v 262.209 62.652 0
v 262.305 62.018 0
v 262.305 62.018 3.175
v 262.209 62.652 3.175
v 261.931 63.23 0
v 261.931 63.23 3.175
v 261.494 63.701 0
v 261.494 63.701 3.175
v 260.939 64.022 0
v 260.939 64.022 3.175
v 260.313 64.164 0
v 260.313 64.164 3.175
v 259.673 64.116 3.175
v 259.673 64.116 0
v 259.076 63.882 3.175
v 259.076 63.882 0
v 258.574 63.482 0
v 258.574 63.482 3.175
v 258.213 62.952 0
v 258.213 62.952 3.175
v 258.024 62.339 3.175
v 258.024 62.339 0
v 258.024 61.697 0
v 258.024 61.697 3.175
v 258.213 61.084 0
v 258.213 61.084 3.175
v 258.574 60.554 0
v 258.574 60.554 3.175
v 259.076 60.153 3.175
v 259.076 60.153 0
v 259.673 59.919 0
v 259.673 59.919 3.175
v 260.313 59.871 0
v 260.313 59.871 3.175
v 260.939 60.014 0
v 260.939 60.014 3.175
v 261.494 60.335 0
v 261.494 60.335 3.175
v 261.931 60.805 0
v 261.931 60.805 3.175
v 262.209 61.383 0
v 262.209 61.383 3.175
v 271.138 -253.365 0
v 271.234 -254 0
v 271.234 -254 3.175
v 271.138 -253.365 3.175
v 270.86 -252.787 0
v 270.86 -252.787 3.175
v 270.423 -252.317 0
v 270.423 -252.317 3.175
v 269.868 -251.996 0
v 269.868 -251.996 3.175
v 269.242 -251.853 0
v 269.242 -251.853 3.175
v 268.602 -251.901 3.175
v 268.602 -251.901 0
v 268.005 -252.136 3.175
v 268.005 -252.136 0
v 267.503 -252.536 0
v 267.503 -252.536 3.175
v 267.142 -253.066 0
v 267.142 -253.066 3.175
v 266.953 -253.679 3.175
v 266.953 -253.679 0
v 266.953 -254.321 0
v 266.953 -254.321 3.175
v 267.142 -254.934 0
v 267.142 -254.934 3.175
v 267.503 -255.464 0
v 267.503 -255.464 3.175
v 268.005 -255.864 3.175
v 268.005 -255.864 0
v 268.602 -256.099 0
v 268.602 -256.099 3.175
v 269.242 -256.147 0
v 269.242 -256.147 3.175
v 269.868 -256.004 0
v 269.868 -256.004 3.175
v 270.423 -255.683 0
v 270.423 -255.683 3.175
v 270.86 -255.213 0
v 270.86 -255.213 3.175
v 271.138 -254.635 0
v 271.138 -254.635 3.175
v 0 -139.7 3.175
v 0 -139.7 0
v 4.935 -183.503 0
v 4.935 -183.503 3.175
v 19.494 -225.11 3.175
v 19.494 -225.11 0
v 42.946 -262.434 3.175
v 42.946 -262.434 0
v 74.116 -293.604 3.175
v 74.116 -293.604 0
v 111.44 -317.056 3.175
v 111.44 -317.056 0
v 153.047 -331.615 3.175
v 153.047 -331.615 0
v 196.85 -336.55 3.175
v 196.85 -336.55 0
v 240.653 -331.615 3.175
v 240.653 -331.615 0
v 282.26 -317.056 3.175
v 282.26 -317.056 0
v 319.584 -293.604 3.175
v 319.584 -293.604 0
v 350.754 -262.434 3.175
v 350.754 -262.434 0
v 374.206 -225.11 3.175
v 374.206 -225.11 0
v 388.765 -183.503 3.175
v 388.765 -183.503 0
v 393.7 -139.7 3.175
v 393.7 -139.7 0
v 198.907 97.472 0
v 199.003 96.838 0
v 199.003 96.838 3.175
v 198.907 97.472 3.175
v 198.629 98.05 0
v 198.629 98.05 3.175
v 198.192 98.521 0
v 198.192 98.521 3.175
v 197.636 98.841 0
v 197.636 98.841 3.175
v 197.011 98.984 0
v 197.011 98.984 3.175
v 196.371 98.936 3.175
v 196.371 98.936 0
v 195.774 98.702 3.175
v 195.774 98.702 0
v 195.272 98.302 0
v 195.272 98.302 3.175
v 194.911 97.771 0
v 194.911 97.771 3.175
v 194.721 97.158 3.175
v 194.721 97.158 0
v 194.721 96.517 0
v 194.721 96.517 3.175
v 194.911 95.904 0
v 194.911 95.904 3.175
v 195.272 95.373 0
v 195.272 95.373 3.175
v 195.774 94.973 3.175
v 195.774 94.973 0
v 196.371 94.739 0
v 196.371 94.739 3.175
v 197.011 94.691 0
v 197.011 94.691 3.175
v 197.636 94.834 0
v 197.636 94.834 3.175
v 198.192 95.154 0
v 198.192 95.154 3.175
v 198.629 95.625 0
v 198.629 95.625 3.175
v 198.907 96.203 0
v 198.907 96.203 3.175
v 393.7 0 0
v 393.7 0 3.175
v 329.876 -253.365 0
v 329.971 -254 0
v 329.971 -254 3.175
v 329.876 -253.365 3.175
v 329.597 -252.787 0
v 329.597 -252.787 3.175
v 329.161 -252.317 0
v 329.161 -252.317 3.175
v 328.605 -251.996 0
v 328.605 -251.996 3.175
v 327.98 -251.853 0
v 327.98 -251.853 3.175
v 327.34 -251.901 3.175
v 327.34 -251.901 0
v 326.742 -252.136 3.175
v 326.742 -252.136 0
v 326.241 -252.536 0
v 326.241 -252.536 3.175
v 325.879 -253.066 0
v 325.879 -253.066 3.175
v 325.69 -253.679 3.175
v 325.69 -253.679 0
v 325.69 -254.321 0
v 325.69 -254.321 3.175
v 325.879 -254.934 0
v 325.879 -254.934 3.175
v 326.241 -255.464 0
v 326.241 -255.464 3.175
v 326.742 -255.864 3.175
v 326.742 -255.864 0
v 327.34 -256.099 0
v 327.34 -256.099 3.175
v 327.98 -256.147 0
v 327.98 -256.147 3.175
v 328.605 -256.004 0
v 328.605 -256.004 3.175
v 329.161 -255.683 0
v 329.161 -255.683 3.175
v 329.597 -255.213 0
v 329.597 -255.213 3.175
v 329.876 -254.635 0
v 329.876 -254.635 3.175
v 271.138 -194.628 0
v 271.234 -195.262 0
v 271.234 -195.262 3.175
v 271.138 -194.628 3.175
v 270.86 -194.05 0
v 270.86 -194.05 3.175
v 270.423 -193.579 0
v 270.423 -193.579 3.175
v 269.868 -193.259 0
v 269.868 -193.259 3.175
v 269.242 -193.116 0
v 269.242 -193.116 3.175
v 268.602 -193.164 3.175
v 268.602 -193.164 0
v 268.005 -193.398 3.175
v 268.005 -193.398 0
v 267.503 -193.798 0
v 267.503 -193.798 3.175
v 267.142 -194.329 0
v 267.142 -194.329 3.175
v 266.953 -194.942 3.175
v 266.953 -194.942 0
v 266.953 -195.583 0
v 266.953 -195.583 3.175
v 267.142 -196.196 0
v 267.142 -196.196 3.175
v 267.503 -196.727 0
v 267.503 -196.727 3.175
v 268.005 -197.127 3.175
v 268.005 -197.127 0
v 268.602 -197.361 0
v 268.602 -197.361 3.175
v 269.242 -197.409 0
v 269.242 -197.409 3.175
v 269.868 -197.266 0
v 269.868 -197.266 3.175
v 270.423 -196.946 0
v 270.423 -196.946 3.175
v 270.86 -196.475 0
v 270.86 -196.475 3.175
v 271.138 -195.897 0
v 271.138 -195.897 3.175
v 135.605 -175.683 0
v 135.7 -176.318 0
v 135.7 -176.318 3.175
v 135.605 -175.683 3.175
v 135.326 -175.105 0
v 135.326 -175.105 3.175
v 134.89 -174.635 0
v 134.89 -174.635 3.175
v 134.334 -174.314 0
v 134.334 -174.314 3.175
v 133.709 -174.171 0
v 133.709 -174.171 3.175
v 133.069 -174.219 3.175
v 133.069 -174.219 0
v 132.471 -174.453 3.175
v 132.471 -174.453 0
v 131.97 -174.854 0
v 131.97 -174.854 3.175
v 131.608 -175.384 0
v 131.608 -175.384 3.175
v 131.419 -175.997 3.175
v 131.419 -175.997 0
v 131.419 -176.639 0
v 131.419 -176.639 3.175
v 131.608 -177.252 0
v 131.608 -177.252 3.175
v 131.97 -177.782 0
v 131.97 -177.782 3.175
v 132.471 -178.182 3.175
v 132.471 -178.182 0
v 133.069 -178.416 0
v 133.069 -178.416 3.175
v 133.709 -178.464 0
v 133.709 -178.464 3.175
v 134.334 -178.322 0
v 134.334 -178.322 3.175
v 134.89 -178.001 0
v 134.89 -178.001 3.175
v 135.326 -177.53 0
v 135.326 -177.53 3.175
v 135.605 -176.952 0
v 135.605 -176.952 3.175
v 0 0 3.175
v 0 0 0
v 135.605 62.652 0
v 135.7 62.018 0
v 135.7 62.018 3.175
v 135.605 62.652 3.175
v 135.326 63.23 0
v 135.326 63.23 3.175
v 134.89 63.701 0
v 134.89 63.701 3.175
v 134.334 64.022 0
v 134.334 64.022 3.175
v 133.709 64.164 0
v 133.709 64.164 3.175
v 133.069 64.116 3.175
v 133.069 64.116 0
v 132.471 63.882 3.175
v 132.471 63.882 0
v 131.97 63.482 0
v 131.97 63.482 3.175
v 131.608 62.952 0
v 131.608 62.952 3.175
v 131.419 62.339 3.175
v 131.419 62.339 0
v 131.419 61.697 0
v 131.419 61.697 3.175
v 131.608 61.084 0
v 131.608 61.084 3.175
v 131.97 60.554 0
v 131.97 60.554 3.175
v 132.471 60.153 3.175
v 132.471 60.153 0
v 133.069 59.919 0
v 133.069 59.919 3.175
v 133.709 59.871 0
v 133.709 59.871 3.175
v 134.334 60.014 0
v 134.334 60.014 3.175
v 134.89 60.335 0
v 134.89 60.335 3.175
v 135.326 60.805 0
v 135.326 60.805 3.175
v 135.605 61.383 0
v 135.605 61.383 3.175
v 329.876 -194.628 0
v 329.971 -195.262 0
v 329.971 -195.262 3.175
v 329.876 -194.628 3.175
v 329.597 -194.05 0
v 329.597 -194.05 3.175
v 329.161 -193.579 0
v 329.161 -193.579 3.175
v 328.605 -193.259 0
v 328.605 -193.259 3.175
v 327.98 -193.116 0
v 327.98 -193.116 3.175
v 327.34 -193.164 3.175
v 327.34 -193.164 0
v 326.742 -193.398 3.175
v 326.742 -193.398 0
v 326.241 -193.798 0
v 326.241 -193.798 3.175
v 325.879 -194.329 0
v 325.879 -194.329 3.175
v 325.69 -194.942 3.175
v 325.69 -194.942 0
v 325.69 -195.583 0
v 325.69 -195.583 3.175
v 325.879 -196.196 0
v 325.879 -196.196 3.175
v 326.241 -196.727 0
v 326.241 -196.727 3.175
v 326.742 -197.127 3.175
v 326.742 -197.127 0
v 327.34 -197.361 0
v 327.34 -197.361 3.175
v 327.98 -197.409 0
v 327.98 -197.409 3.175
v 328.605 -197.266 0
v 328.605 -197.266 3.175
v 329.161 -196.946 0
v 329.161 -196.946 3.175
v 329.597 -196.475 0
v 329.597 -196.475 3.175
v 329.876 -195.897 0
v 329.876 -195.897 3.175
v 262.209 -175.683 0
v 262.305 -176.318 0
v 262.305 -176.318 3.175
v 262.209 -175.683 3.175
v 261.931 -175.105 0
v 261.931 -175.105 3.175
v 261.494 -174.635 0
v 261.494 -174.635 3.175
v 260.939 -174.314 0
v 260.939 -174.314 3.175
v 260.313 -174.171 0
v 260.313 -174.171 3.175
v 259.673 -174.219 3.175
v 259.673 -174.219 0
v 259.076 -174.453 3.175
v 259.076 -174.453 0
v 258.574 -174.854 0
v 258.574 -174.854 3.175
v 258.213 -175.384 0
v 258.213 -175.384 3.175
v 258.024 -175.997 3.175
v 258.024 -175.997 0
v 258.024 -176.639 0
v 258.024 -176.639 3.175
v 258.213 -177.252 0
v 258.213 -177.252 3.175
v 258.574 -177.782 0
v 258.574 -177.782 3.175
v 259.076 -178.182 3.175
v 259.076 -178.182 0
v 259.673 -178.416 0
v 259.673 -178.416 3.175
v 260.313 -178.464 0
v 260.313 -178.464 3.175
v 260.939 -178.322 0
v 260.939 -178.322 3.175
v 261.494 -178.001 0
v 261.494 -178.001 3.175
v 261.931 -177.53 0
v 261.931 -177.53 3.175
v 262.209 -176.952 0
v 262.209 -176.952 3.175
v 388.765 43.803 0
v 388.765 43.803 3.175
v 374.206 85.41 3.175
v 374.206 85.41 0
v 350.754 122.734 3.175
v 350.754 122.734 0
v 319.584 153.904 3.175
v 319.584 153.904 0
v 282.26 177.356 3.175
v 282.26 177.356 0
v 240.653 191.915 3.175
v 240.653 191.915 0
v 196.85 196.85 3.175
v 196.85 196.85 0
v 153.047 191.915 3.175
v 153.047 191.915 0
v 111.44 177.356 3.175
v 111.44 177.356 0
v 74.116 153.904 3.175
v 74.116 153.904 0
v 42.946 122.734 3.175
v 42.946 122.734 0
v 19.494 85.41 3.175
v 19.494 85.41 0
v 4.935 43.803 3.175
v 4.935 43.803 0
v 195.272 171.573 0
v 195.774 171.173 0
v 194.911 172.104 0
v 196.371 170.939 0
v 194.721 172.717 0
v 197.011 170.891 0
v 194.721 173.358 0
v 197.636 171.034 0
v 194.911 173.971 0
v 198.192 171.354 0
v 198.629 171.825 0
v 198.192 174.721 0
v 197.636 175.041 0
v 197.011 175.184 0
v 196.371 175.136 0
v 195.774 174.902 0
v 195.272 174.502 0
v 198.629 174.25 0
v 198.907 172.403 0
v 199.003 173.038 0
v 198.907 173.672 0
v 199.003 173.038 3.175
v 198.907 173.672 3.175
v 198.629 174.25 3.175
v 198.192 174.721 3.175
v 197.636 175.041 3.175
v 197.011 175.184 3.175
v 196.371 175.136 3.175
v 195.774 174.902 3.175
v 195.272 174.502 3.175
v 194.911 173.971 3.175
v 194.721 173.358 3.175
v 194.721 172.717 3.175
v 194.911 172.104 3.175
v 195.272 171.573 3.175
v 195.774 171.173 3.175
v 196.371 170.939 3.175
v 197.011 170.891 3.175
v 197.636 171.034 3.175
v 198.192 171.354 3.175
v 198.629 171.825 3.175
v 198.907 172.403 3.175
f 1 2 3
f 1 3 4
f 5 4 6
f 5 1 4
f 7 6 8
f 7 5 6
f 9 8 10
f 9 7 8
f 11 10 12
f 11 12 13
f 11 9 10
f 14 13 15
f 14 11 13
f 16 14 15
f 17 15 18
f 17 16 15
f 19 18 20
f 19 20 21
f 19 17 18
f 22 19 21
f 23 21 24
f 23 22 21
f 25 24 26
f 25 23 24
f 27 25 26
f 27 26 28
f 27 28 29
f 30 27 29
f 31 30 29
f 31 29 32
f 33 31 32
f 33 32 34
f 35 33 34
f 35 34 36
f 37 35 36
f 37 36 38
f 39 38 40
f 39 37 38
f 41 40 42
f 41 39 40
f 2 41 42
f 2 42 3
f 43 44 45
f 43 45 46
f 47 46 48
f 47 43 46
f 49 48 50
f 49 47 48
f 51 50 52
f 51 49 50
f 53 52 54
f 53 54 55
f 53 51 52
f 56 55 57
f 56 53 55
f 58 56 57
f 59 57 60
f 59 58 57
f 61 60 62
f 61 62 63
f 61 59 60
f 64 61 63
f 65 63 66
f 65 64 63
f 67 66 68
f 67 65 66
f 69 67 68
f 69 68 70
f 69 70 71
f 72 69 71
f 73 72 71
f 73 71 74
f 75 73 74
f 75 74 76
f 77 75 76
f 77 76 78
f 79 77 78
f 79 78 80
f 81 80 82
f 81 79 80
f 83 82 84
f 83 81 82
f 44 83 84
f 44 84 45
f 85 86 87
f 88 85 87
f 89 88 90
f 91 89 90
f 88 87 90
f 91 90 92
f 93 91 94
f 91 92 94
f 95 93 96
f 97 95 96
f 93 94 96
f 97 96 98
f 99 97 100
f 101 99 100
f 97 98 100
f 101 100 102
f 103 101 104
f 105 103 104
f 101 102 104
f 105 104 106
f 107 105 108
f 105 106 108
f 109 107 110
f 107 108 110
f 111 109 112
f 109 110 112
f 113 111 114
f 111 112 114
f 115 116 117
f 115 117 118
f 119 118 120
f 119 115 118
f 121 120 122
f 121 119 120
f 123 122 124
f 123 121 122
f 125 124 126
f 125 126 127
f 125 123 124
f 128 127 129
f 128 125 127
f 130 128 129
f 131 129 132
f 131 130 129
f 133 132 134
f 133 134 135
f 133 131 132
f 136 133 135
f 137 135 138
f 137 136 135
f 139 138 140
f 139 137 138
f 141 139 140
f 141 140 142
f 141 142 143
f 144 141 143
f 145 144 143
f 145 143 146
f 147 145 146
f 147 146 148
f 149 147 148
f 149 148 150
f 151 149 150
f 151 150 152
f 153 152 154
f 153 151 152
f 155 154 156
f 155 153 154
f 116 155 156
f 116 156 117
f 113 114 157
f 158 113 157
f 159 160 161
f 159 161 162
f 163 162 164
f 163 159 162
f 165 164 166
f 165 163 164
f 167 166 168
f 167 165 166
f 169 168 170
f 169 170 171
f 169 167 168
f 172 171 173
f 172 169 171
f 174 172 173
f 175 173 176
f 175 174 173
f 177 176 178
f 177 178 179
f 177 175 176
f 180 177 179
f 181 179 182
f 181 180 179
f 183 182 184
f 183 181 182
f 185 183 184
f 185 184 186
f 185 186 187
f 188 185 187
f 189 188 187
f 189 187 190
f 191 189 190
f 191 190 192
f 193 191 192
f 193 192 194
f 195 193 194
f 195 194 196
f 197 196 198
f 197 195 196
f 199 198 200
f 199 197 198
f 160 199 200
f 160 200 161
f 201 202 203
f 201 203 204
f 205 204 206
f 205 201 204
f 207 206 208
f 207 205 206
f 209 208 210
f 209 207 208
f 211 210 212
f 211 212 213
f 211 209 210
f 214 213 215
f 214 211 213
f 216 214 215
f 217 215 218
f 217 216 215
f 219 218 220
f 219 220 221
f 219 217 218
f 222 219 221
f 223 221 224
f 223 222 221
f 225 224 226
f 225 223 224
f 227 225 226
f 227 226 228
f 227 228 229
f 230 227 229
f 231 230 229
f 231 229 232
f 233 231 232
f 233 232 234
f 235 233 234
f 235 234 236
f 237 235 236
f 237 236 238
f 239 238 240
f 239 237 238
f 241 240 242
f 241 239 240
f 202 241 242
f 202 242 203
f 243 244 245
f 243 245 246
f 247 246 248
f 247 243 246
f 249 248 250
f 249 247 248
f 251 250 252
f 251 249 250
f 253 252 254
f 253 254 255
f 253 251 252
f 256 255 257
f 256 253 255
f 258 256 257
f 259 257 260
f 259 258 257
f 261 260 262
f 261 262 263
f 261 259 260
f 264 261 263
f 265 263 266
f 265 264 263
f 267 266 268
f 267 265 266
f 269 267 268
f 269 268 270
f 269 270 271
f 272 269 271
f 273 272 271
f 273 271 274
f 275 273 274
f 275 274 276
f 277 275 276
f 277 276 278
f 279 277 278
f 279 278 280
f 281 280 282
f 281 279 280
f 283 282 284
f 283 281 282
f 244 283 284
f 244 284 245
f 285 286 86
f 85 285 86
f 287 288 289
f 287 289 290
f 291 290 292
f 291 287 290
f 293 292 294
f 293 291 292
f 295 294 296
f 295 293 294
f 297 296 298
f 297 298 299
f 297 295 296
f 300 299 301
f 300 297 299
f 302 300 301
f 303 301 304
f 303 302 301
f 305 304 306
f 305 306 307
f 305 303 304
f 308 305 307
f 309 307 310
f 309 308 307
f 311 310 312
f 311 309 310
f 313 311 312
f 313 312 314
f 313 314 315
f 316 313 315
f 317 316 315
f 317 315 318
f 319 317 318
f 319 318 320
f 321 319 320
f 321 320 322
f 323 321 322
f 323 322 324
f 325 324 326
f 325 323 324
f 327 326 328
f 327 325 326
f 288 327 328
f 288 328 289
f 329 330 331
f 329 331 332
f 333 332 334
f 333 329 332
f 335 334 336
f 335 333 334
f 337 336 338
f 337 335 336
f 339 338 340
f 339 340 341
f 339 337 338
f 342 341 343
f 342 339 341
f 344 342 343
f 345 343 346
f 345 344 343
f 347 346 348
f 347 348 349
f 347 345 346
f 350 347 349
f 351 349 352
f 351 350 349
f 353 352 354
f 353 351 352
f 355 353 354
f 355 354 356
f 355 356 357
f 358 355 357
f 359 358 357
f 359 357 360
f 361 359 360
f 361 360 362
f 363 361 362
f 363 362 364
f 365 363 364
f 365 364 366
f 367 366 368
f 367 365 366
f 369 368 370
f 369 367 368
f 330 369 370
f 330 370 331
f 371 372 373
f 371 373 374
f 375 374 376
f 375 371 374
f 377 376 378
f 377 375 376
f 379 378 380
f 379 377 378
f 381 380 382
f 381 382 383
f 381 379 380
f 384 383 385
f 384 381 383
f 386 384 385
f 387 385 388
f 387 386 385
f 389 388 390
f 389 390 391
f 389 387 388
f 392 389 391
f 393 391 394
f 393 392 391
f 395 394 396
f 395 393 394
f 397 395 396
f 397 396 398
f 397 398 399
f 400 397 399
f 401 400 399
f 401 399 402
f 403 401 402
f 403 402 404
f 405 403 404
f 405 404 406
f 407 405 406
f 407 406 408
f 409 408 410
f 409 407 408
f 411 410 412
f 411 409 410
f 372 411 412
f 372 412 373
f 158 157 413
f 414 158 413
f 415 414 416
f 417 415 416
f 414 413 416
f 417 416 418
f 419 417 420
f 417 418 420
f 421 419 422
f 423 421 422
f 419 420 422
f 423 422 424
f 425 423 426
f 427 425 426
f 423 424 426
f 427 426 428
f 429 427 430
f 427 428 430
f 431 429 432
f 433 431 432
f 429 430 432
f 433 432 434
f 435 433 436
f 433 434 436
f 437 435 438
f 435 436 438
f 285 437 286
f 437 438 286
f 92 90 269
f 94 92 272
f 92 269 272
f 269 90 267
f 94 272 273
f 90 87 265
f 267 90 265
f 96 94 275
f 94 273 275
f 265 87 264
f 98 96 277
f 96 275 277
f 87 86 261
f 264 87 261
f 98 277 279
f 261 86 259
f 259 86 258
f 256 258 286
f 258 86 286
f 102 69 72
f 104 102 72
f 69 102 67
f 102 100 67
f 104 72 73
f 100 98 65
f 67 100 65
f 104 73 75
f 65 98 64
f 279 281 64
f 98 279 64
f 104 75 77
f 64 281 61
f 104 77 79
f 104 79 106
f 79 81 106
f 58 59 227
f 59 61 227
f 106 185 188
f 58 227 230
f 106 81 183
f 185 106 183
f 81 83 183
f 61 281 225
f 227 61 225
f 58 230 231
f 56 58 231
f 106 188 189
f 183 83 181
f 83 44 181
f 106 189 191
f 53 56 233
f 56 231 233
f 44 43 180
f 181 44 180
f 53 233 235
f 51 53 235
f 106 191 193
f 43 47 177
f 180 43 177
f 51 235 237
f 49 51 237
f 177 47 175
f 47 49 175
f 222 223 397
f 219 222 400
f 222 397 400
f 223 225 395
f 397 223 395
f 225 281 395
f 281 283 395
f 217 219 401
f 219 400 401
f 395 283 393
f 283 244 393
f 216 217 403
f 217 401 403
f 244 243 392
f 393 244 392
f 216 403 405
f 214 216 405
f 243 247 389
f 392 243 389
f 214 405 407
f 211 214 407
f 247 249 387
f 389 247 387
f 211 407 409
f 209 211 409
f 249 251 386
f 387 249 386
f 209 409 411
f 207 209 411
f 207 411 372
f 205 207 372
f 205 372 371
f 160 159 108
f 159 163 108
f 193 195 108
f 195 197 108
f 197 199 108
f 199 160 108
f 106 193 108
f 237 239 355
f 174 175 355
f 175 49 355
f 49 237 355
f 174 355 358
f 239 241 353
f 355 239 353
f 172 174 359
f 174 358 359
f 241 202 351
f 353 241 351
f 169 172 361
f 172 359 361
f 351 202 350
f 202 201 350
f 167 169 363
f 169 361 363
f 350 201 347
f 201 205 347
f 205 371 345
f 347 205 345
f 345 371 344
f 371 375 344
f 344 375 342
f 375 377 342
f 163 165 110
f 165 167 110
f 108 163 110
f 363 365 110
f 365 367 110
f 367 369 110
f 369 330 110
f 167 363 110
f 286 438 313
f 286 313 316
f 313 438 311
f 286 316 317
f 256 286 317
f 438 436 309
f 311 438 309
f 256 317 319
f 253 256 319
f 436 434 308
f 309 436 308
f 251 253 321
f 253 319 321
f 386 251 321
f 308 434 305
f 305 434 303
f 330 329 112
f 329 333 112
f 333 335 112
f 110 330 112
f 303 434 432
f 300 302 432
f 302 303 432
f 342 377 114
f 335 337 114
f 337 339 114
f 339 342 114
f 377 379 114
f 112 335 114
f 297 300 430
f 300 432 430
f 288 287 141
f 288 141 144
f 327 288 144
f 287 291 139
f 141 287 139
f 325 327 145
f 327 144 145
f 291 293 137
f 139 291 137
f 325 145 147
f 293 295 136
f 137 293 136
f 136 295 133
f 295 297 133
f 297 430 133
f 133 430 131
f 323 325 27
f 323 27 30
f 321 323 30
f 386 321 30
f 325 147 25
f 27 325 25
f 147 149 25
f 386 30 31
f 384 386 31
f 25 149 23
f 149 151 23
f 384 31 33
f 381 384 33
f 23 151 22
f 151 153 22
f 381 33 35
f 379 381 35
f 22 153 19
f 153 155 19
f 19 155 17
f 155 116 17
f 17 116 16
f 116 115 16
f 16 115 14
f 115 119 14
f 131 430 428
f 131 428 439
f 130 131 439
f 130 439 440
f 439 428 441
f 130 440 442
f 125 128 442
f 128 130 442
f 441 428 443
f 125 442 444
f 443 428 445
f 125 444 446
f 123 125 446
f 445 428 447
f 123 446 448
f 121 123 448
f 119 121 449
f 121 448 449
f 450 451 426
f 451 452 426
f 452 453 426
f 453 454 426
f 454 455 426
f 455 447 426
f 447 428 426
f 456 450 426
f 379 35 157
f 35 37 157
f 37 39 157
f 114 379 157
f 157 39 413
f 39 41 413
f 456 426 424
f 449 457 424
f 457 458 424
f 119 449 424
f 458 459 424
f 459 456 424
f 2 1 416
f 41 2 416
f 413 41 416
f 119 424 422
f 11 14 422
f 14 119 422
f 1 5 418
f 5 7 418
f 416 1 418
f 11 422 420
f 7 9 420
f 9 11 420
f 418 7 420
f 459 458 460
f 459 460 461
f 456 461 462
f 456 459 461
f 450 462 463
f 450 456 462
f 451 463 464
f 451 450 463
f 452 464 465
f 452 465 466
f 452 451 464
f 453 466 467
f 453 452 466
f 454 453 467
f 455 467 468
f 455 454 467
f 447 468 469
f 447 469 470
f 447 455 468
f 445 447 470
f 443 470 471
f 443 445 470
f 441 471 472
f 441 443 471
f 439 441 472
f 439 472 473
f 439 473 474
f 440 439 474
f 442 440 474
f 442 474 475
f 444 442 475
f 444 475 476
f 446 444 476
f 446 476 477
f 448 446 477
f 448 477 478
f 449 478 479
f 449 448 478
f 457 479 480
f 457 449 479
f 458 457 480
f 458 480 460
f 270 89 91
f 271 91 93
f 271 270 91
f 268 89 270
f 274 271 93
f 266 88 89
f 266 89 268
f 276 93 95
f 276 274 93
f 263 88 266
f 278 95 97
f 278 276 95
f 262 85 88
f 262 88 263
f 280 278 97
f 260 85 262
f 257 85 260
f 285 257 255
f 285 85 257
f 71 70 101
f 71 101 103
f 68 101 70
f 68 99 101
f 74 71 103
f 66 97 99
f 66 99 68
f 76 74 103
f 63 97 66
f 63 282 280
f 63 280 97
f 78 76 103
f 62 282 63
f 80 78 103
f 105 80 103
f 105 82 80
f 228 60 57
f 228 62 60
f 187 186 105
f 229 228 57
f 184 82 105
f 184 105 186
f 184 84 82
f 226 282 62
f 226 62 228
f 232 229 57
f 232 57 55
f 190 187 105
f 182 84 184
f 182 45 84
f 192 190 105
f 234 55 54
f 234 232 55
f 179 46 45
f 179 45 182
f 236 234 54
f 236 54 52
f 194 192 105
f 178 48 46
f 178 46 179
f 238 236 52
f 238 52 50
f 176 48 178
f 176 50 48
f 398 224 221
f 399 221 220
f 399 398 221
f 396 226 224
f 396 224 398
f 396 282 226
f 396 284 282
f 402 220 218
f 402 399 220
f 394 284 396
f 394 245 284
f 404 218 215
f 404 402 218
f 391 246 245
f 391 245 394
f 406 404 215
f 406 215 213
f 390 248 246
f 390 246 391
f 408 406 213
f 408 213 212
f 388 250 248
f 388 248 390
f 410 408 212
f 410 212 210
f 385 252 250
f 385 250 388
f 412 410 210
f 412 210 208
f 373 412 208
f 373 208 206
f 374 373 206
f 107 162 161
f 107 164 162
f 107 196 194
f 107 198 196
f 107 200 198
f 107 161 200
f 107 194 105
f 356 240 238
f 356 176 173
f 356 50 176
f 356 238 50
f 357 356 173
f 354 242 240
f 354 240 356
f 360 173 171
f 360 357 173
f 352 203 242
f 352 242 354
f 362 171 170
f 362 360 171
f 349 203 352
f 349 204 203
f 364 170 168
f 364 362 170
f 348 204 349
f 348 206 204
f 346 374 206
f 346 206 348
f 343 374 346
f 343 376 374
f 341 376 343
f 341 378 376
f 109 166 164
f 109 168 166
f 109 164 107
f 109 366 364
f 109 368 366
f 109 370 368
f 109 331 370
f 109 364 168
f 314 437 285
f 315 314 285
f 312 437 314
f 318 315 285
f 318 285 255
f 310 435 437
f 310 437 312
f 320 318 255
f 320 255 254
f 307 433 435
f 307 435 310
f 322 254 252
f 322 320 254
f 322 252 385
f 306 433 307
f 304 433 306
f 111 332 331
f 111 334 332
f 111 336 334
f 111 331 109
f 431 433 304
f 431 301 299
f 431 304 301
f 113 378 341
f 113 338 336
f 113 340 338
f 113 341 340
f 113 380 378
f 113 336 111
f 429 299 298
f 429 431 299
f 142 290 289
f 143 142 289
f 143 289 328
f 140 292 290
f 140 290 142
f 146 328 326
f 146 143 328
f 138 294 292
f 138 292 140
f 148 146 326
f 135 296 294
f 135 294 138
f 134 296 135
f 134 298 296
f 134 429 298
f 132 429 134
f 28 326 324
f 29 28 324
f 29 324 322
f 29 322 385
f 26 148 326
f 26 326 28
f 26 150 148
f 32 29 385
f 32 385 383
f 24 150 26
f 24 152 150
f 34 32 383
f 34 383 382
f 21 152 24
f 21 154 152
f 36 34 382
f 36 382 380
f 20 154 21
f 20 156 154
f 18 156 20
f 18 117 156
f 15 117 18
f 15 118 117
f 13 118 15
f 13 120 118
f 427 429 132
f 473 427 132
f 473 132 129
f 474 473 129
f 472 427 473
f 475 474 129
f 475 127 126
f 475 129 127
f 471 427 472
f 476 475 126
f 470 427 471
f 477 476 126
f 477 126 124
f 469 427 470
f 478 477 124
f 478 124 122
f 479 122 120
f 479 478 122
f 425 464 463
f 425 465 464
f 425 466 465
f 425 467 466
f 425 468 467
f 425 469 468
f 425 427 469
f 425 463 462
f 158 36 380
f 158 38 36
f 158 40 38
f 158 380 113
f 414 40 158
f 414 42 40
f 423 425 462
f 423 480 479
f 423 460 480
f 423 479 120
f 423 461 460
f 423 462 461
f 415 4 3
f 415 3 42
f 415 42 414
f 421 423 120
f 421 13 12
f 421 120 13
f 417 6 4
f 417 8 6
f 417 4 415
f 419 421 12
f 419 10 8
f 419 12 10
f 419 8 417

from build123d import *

# Parameters (mm, degrees)
F0_R     = 2.15265
F1_DEPTH = 3.175


with BuildPart() as f1:
    # F0 (on Top) → F1 (new body)
    with BuildSketch(Plane.XY):
        with BuildLine():
            ThreePointArc((393.7, 0), (196.85, 196.85), (0, 0))
            Line((0, 0), (0, -139.7))
            ThreePointArc((0, -139.7), (196.85, -336.55), (393.7, -139.7))
            Line((393.7, -139.7), (393.7, 0))
        make_face()
        with Locations((133.547731, -176.317746)):
            Circle(F0_R, mode=Mode.SUBTRACT)
        with Locations((269.08125, -254)):
            Circle(F0_R, mode=Mode.SUBTRACT)
        with Locations((327.81875, -254)):
            Circle(F0_R, mode=Mode.SUBTRACT)
        with Locations((269.08125, -195.2625)):
            Circle(F0_R, mode=Mode.SUBTRACT)
        with Locations((260.152269, -176.317746)):
            Circle(F0_R, mode=Mode.SUBTRACT)
        with Locations((327.81875, -195.2625)):
            Circle(F0_R, mode=Mode.SUBTRACT)
        with Locations((133.547731, 62.017746)):
            Circle(F0_R, mode=Mode.SUBTRACT)
        with Locations((260.152269, 62.017746)):
            Circle(F0_R, mode=Mode.SUBTRACT)
        with Locations((196.85, 96.8375)):
            Circle(F0_R, mode=Mode.SUBTRACT)
        with Locations((196.85, 173.0375)):
            Circle(F0_R, mode=Mode.SUBTRACT)
    extrude(amount=F1_DEPTH)


solid = f1.part
